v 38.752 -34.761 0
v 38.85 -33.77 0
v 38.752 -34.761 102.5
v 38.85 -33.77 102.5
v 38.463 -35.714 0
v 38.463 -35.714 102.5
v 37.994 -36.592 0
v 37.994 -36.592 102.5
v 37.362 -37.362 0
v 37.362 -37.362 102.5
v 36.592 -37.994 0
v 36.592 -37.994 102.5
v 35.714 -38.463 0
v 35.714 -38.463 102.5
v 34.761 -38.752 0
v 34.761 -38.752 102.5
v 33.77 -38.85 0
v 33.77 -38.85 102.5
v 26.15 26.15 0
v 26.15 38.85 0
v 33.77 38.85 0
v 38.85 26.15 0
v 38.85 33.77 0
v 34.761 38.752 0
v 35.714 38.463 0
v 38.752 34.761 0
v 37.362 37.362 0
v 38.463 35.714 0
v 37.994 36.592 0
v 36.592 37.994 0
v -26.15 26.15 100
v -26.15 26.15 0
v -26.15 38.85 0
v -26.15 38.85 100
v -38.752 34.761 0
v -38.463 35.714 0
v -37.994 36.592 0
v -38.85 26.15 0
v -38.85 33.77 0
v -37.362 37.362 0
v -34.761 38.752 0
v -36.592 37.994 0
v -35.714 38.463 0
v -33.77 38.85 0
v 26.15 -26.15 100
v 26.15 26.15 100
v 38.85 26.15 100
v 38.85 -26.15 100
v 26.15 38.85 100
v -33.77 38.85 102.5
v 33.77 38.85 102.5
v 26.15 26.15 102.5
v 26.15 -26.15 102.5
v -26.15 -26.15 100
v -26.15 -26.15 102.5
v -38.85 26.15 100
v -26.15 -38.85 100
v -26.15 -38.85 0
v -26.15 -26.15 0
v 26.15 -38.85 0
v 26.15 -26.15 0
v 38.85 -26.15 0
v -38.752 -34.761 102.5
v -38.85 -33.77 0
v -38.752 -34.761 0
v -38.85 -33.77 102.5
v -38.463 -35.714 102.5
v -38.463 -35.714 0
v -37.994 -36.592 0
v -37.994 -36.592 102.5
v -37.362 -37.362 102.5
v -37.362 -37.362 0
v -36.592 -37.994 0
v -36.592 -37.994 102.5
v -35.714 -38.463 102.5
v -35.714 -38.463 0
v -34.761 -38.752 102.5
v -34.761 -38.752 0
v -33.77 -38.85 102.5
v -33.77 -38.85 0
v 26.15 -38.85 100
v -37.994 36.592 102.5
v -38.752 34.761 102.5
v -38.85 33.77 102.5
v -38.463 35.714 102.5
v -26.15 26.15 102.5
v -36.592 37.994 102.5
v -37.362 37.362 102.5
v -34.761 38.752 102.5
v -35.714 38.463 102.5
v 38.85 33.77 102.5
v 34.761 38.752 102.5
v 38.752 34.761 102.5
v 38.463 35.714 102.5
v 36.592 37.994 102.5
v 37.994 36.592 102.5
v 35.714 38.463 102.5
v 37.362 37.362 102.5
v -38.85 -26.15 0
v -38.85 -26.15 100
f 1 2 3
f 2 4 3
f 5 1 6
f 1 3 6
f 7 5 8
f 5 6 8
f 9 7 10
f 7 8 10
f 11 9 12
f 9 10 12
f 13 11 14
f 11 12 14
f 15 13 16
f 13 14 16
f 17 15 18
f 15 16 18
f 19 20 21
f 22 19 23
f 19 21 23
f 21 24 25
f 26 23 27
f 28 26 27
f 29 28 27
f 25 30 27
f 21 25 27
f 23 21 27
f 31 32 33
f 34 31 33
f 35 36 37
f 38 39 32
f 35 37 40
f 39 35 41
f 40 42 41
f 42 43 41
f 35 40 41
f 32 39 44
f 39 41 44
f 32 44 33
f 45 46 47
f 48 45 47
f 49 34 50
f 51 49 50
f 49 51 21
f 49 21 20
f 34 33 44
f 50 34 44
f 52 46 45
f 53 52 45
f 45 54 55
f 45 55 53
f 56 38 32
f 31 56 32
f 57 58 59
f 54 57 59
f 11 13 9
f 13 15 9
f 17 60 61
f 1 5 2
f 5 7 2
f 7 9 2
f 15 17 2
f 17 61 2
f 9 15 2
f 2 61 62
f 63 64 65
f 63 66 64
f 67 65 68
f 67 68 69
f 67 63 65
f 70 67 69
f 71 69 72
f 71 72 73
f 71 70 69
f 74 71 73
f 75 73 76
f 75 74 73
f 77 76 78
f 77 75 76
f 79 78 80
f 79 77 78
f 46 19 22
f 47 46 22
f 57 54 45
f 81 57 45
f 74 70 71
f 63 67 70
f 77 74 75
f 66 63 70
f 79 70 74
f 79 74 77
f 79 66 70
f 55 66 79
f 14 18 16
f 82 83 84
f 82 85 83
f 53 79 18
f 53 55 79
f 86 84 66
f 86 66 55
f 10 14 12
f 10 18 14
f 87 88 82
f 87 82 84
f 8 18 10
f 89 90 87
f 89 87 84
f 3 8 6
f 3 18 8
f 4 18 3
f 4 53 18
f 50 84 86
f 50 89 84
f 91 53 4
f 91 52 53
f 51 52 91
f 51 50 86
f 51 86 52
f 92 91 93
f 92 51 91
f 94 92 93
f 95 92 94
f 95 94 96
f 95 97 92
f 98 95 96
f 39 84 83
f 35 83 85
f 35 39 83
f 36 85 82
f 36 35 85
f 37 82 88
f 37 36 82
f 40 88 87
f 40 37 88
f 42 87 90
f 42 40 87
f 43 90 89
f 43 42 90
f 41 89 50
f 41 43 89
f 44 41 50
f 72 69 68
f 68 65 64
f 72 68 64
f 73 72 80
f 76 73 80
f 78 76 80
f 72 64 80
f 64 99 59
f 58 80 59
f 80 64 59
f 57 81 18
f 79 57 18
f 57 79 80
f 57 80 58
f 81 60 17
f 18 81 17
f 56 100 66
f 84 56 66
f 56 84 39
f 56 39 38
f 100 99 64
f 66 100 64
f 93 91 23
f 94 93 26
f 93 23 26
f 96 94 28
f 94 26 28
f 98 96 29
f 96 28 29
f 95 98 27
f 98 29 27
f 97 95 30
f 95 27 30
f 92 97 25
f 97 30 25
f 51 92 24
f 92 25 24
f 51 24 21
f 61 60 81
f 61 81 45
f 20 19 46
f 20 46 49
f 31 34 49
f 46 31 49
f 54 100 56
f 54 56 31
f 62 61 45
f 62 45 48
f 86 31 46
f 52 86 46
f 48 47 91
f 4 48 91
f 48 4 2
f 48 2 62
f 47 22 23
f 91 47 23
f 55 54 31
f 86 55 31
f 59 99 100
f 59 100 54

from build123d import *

# Parameters (mm, degrees)
F0_W     = 12.7
F0_H     = 12.7
F1_DEPTH = 100
F2_W     = 12.7
F2_H     = 52.3
F2_H_2   = 12.7
F2_W_2   = 52.3
F3_DEPTH = 2.5
F4_R     = 5.08


with BuildPart() as f1:
    # F0 (on Top) → F1 (new body)
    with BuildSketch(Plane.XY):
        with Locations((-32.5, 32.5)):
            Rectangle(F0_W, F0_H)
    extrude(amount=F1_DEPTH)



with BuildPart() as f1b:
    # F0 (on Top) → F1, piece 2 (new body)
    with BuildSketch(Plane.XY):
        with Locations((32.5, 32.5)):
            Rectangle(F0_W, F0_H)
    extrude(amount=F1_DEPTH)


with BuildPart() as f1c:
    # F0 (on Top) → F1, piece 3 (new body)
    with BuildSketch(Plane.XY):
        with Locations((32.5, -32.5)):
            Rectangle(F0_W, F0_H)
    extrude(amount=F1_DEPTH)


with BuildPart() as f1d:
    # F0 (on Top) → F1, piece 4 (new body)
    with BuildSketch(Plane.XY):
        with Locations((-32.5, -32.5)):
            Rectangle(F0_W, F0_H)
    extrude(amount=F1_DEPTH)


with BuildPart() as f1_1:
    add(f1.part)

    add(f1b.part)  # F3 merges F1b

    add(f1c.part)  # F3 merges F1c

    add(f1d.part)  # F3 merges F1d
    # F2 (on face) → F3 (join)
    with BuildSketch(Plane.XY.offset(100)):
        with Locations((-32.5, 0)):
            Rectangle(F2_W, F2_H)
        with Locations((-32.5, 32.5)):
            Rectangle(F2_W, F2_H_2)
        with Locations((0, 32.5)):
            Rectangle(F2_W_2, F2_H_2)
        with Locations((32.5, 32.5)):
            Rectangle(F2_W, F2_H_2)
        with Locations((32.5, 0)):
            Rectangle(F2_W, F2_H)
        with Locations((32.5, -32.5)):
            Rectangle(F2_W, F2_H_2)
        with Locations((0, -32.5)):
            Rectangle(F2_W_2, F2_H_2)
        with Locations((-32.5, -32.5)):
            Rectangle(F2_W, F2_H_2)
    extrude(amount=F3_DEPTH)

    # F4
    f4_edges = [f1_1.edges().sort_by_distance(p)[0] for p in [
        (38.85, -38.85, 51.25),
        (38.85, 38.85, 51.25),
        (-38.85, 38.85, 51.25),
        (-38.85, -38.85, 51.25),
    ]]
    fillet(f4_edges, radius=F4_R)


solid = f1_1.part
